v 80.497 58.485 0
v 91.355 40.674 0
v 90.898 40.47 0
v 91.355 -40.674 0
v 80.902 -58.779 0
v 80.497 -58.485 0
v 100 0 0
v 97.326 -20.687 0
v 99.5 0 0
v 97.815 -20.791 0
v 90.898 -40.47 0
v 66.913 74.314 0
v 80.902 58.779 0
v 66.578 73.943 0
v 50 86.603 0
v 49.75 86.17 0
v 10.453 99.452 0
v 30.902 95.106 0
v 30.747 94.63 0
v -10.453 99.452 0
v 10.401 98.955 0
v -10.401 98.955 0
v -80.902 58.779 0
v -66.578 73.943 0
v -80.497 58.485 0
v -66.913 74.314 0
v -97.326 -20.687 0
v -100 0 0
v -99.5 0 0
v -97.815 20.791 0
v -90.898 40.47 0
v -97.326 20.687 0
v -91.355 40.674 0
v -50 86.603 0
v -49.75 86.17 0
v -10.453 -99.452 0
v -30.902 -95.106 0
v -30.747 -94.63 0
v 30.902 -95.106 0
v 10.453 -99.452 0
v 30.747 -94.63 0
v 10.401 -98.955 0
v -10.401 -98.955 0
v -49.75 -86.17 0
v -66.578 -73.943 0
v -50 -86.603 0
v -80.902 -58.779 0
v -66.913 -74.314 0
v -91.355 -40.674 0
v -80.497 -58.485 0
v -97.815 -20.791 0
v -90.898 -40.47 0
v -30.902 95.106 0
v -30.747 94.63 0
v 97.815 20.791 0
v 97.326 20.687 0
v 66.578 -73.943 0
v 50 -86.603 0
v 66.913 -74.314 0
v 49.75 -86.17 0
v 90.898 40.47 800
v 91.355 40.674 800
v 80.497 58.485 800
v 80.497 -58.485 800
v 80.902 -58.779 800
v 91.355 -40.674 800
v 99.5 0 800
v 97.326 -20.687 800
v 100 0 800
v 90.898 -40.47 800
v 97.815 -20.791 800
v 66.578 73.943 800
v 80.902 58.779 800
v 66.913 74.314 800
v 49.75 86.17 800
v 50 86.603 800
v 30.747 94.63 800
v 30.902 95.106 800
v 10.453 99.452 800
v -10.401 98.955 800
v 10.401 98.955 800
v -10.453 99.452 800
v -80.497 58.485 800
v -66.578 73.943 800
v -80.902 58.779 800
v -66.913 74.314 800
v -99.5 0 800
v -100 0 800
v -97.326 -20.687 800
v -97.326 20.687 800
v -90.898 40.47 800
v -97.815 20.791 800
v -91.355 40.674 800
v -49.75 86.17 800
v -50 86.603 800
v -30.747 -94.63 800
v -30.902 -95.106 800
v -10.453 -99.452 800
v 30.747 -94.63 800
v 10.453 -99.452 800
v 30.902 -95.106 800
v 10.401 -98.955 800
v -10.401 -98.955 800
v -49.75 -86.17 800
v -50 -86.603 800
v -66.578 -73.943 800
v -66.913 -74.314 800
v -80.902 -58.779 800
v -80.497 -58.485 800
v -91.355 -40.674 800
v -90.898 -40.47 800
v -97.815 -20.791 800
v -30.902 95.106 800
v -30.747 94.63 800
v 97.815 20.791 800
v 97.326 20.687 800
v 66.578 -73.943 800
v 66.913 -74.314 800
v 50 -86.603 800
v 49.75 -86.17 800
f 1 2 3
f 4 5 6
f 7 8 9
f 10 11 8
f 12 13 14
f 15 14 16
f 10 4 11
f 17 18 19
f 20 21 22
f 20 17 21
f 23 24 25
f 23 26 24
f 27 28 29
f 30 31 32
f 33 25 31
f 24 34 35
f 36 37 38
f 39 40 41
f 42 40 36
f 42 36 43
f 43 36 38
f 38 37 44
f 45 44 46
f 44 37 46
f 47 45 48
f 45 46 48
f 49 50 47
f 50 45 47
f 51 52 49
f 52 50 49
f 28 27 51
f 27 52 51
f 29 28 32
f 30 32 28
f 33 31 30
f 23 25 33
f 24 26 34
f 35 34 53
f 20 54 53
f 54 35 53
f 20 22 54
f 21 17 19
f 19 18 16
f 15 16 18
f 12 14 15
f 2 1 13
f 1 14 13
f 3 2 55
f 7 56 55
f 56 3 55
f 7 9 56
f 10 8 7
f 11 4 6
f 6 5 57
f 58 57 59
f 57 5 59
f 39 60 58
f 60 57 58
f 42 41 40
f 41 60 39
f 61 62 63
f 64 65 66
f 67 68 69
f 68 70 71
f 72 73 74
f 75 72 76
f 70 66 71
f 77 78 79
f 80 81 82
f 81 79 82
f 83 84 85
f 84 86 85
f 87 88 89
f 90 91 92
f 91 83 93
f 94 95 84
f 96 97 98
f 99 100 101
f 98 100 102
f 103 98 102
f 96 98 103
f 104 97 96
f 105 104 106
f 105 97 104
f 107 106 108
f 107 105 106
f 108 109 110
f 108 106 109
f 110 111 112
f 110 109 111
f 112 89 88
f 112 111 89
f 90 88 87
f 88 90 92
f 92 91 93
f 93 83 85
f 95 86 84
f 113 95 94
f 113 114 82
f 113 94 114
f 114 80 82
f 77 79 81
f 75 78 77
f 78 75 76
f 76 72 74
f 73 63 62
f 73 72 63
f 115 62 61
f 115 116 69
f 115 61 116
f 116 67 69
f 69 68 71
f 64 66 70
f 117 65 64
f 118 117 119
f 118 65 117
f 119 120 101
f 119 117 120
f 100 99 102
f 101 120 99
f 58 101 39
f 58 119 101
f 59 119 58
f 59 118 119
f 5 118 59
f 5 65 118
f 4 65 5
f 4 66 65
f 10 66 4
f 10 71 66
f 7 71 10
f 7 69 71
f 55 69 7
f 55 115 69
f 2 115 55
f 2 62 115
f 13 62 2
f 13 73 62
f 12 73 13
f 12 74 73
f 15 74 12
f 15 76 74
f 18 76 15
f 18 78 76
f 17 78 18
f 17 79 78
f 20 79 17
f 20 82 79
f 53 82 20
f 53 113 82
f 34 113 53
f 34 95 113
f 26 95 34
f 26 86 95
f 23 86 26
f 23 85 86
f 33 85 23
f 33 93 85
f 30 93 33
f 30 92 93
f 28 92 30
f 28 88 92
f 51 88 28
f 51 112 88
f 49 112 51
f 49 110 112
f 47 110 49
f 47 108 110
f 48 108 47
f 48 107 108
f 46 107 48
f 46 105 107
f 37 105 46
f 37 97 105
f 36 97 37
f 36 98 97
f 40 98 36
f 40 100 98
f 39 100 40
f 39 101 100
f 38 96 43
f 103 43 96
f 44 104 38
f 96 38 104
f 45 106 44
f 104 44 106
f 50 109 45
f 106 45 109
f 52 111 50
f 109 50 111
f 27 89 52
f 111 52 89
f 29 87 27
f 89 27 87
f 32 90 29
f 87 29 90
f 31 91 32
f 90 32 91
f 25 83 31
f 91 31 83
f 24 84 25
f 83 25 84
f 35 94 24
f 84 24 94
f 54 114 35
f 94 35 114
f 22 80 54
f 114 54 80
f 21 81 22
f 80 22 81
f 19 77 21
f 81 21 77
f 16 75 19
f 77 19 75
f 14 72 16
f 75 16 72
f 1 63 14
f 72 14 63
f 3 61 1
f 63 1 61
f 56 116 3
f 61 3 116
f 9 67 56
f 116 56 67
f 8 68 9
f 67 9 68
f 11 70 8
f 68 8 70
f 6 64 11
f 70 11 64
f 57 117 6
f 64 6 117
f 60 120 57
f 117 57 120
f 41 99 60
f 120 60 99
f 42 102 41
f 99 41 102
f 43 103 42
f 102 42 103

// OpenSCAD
length=800;
diameter=200;
module pipe(l=length,d=diameter) {
 //diameter
    r=d/2;
    wt=1;
    linear_extrude(l)
    difference() {
        circle(r);
        circle(r-wt/2);
    }
}

pipe();
